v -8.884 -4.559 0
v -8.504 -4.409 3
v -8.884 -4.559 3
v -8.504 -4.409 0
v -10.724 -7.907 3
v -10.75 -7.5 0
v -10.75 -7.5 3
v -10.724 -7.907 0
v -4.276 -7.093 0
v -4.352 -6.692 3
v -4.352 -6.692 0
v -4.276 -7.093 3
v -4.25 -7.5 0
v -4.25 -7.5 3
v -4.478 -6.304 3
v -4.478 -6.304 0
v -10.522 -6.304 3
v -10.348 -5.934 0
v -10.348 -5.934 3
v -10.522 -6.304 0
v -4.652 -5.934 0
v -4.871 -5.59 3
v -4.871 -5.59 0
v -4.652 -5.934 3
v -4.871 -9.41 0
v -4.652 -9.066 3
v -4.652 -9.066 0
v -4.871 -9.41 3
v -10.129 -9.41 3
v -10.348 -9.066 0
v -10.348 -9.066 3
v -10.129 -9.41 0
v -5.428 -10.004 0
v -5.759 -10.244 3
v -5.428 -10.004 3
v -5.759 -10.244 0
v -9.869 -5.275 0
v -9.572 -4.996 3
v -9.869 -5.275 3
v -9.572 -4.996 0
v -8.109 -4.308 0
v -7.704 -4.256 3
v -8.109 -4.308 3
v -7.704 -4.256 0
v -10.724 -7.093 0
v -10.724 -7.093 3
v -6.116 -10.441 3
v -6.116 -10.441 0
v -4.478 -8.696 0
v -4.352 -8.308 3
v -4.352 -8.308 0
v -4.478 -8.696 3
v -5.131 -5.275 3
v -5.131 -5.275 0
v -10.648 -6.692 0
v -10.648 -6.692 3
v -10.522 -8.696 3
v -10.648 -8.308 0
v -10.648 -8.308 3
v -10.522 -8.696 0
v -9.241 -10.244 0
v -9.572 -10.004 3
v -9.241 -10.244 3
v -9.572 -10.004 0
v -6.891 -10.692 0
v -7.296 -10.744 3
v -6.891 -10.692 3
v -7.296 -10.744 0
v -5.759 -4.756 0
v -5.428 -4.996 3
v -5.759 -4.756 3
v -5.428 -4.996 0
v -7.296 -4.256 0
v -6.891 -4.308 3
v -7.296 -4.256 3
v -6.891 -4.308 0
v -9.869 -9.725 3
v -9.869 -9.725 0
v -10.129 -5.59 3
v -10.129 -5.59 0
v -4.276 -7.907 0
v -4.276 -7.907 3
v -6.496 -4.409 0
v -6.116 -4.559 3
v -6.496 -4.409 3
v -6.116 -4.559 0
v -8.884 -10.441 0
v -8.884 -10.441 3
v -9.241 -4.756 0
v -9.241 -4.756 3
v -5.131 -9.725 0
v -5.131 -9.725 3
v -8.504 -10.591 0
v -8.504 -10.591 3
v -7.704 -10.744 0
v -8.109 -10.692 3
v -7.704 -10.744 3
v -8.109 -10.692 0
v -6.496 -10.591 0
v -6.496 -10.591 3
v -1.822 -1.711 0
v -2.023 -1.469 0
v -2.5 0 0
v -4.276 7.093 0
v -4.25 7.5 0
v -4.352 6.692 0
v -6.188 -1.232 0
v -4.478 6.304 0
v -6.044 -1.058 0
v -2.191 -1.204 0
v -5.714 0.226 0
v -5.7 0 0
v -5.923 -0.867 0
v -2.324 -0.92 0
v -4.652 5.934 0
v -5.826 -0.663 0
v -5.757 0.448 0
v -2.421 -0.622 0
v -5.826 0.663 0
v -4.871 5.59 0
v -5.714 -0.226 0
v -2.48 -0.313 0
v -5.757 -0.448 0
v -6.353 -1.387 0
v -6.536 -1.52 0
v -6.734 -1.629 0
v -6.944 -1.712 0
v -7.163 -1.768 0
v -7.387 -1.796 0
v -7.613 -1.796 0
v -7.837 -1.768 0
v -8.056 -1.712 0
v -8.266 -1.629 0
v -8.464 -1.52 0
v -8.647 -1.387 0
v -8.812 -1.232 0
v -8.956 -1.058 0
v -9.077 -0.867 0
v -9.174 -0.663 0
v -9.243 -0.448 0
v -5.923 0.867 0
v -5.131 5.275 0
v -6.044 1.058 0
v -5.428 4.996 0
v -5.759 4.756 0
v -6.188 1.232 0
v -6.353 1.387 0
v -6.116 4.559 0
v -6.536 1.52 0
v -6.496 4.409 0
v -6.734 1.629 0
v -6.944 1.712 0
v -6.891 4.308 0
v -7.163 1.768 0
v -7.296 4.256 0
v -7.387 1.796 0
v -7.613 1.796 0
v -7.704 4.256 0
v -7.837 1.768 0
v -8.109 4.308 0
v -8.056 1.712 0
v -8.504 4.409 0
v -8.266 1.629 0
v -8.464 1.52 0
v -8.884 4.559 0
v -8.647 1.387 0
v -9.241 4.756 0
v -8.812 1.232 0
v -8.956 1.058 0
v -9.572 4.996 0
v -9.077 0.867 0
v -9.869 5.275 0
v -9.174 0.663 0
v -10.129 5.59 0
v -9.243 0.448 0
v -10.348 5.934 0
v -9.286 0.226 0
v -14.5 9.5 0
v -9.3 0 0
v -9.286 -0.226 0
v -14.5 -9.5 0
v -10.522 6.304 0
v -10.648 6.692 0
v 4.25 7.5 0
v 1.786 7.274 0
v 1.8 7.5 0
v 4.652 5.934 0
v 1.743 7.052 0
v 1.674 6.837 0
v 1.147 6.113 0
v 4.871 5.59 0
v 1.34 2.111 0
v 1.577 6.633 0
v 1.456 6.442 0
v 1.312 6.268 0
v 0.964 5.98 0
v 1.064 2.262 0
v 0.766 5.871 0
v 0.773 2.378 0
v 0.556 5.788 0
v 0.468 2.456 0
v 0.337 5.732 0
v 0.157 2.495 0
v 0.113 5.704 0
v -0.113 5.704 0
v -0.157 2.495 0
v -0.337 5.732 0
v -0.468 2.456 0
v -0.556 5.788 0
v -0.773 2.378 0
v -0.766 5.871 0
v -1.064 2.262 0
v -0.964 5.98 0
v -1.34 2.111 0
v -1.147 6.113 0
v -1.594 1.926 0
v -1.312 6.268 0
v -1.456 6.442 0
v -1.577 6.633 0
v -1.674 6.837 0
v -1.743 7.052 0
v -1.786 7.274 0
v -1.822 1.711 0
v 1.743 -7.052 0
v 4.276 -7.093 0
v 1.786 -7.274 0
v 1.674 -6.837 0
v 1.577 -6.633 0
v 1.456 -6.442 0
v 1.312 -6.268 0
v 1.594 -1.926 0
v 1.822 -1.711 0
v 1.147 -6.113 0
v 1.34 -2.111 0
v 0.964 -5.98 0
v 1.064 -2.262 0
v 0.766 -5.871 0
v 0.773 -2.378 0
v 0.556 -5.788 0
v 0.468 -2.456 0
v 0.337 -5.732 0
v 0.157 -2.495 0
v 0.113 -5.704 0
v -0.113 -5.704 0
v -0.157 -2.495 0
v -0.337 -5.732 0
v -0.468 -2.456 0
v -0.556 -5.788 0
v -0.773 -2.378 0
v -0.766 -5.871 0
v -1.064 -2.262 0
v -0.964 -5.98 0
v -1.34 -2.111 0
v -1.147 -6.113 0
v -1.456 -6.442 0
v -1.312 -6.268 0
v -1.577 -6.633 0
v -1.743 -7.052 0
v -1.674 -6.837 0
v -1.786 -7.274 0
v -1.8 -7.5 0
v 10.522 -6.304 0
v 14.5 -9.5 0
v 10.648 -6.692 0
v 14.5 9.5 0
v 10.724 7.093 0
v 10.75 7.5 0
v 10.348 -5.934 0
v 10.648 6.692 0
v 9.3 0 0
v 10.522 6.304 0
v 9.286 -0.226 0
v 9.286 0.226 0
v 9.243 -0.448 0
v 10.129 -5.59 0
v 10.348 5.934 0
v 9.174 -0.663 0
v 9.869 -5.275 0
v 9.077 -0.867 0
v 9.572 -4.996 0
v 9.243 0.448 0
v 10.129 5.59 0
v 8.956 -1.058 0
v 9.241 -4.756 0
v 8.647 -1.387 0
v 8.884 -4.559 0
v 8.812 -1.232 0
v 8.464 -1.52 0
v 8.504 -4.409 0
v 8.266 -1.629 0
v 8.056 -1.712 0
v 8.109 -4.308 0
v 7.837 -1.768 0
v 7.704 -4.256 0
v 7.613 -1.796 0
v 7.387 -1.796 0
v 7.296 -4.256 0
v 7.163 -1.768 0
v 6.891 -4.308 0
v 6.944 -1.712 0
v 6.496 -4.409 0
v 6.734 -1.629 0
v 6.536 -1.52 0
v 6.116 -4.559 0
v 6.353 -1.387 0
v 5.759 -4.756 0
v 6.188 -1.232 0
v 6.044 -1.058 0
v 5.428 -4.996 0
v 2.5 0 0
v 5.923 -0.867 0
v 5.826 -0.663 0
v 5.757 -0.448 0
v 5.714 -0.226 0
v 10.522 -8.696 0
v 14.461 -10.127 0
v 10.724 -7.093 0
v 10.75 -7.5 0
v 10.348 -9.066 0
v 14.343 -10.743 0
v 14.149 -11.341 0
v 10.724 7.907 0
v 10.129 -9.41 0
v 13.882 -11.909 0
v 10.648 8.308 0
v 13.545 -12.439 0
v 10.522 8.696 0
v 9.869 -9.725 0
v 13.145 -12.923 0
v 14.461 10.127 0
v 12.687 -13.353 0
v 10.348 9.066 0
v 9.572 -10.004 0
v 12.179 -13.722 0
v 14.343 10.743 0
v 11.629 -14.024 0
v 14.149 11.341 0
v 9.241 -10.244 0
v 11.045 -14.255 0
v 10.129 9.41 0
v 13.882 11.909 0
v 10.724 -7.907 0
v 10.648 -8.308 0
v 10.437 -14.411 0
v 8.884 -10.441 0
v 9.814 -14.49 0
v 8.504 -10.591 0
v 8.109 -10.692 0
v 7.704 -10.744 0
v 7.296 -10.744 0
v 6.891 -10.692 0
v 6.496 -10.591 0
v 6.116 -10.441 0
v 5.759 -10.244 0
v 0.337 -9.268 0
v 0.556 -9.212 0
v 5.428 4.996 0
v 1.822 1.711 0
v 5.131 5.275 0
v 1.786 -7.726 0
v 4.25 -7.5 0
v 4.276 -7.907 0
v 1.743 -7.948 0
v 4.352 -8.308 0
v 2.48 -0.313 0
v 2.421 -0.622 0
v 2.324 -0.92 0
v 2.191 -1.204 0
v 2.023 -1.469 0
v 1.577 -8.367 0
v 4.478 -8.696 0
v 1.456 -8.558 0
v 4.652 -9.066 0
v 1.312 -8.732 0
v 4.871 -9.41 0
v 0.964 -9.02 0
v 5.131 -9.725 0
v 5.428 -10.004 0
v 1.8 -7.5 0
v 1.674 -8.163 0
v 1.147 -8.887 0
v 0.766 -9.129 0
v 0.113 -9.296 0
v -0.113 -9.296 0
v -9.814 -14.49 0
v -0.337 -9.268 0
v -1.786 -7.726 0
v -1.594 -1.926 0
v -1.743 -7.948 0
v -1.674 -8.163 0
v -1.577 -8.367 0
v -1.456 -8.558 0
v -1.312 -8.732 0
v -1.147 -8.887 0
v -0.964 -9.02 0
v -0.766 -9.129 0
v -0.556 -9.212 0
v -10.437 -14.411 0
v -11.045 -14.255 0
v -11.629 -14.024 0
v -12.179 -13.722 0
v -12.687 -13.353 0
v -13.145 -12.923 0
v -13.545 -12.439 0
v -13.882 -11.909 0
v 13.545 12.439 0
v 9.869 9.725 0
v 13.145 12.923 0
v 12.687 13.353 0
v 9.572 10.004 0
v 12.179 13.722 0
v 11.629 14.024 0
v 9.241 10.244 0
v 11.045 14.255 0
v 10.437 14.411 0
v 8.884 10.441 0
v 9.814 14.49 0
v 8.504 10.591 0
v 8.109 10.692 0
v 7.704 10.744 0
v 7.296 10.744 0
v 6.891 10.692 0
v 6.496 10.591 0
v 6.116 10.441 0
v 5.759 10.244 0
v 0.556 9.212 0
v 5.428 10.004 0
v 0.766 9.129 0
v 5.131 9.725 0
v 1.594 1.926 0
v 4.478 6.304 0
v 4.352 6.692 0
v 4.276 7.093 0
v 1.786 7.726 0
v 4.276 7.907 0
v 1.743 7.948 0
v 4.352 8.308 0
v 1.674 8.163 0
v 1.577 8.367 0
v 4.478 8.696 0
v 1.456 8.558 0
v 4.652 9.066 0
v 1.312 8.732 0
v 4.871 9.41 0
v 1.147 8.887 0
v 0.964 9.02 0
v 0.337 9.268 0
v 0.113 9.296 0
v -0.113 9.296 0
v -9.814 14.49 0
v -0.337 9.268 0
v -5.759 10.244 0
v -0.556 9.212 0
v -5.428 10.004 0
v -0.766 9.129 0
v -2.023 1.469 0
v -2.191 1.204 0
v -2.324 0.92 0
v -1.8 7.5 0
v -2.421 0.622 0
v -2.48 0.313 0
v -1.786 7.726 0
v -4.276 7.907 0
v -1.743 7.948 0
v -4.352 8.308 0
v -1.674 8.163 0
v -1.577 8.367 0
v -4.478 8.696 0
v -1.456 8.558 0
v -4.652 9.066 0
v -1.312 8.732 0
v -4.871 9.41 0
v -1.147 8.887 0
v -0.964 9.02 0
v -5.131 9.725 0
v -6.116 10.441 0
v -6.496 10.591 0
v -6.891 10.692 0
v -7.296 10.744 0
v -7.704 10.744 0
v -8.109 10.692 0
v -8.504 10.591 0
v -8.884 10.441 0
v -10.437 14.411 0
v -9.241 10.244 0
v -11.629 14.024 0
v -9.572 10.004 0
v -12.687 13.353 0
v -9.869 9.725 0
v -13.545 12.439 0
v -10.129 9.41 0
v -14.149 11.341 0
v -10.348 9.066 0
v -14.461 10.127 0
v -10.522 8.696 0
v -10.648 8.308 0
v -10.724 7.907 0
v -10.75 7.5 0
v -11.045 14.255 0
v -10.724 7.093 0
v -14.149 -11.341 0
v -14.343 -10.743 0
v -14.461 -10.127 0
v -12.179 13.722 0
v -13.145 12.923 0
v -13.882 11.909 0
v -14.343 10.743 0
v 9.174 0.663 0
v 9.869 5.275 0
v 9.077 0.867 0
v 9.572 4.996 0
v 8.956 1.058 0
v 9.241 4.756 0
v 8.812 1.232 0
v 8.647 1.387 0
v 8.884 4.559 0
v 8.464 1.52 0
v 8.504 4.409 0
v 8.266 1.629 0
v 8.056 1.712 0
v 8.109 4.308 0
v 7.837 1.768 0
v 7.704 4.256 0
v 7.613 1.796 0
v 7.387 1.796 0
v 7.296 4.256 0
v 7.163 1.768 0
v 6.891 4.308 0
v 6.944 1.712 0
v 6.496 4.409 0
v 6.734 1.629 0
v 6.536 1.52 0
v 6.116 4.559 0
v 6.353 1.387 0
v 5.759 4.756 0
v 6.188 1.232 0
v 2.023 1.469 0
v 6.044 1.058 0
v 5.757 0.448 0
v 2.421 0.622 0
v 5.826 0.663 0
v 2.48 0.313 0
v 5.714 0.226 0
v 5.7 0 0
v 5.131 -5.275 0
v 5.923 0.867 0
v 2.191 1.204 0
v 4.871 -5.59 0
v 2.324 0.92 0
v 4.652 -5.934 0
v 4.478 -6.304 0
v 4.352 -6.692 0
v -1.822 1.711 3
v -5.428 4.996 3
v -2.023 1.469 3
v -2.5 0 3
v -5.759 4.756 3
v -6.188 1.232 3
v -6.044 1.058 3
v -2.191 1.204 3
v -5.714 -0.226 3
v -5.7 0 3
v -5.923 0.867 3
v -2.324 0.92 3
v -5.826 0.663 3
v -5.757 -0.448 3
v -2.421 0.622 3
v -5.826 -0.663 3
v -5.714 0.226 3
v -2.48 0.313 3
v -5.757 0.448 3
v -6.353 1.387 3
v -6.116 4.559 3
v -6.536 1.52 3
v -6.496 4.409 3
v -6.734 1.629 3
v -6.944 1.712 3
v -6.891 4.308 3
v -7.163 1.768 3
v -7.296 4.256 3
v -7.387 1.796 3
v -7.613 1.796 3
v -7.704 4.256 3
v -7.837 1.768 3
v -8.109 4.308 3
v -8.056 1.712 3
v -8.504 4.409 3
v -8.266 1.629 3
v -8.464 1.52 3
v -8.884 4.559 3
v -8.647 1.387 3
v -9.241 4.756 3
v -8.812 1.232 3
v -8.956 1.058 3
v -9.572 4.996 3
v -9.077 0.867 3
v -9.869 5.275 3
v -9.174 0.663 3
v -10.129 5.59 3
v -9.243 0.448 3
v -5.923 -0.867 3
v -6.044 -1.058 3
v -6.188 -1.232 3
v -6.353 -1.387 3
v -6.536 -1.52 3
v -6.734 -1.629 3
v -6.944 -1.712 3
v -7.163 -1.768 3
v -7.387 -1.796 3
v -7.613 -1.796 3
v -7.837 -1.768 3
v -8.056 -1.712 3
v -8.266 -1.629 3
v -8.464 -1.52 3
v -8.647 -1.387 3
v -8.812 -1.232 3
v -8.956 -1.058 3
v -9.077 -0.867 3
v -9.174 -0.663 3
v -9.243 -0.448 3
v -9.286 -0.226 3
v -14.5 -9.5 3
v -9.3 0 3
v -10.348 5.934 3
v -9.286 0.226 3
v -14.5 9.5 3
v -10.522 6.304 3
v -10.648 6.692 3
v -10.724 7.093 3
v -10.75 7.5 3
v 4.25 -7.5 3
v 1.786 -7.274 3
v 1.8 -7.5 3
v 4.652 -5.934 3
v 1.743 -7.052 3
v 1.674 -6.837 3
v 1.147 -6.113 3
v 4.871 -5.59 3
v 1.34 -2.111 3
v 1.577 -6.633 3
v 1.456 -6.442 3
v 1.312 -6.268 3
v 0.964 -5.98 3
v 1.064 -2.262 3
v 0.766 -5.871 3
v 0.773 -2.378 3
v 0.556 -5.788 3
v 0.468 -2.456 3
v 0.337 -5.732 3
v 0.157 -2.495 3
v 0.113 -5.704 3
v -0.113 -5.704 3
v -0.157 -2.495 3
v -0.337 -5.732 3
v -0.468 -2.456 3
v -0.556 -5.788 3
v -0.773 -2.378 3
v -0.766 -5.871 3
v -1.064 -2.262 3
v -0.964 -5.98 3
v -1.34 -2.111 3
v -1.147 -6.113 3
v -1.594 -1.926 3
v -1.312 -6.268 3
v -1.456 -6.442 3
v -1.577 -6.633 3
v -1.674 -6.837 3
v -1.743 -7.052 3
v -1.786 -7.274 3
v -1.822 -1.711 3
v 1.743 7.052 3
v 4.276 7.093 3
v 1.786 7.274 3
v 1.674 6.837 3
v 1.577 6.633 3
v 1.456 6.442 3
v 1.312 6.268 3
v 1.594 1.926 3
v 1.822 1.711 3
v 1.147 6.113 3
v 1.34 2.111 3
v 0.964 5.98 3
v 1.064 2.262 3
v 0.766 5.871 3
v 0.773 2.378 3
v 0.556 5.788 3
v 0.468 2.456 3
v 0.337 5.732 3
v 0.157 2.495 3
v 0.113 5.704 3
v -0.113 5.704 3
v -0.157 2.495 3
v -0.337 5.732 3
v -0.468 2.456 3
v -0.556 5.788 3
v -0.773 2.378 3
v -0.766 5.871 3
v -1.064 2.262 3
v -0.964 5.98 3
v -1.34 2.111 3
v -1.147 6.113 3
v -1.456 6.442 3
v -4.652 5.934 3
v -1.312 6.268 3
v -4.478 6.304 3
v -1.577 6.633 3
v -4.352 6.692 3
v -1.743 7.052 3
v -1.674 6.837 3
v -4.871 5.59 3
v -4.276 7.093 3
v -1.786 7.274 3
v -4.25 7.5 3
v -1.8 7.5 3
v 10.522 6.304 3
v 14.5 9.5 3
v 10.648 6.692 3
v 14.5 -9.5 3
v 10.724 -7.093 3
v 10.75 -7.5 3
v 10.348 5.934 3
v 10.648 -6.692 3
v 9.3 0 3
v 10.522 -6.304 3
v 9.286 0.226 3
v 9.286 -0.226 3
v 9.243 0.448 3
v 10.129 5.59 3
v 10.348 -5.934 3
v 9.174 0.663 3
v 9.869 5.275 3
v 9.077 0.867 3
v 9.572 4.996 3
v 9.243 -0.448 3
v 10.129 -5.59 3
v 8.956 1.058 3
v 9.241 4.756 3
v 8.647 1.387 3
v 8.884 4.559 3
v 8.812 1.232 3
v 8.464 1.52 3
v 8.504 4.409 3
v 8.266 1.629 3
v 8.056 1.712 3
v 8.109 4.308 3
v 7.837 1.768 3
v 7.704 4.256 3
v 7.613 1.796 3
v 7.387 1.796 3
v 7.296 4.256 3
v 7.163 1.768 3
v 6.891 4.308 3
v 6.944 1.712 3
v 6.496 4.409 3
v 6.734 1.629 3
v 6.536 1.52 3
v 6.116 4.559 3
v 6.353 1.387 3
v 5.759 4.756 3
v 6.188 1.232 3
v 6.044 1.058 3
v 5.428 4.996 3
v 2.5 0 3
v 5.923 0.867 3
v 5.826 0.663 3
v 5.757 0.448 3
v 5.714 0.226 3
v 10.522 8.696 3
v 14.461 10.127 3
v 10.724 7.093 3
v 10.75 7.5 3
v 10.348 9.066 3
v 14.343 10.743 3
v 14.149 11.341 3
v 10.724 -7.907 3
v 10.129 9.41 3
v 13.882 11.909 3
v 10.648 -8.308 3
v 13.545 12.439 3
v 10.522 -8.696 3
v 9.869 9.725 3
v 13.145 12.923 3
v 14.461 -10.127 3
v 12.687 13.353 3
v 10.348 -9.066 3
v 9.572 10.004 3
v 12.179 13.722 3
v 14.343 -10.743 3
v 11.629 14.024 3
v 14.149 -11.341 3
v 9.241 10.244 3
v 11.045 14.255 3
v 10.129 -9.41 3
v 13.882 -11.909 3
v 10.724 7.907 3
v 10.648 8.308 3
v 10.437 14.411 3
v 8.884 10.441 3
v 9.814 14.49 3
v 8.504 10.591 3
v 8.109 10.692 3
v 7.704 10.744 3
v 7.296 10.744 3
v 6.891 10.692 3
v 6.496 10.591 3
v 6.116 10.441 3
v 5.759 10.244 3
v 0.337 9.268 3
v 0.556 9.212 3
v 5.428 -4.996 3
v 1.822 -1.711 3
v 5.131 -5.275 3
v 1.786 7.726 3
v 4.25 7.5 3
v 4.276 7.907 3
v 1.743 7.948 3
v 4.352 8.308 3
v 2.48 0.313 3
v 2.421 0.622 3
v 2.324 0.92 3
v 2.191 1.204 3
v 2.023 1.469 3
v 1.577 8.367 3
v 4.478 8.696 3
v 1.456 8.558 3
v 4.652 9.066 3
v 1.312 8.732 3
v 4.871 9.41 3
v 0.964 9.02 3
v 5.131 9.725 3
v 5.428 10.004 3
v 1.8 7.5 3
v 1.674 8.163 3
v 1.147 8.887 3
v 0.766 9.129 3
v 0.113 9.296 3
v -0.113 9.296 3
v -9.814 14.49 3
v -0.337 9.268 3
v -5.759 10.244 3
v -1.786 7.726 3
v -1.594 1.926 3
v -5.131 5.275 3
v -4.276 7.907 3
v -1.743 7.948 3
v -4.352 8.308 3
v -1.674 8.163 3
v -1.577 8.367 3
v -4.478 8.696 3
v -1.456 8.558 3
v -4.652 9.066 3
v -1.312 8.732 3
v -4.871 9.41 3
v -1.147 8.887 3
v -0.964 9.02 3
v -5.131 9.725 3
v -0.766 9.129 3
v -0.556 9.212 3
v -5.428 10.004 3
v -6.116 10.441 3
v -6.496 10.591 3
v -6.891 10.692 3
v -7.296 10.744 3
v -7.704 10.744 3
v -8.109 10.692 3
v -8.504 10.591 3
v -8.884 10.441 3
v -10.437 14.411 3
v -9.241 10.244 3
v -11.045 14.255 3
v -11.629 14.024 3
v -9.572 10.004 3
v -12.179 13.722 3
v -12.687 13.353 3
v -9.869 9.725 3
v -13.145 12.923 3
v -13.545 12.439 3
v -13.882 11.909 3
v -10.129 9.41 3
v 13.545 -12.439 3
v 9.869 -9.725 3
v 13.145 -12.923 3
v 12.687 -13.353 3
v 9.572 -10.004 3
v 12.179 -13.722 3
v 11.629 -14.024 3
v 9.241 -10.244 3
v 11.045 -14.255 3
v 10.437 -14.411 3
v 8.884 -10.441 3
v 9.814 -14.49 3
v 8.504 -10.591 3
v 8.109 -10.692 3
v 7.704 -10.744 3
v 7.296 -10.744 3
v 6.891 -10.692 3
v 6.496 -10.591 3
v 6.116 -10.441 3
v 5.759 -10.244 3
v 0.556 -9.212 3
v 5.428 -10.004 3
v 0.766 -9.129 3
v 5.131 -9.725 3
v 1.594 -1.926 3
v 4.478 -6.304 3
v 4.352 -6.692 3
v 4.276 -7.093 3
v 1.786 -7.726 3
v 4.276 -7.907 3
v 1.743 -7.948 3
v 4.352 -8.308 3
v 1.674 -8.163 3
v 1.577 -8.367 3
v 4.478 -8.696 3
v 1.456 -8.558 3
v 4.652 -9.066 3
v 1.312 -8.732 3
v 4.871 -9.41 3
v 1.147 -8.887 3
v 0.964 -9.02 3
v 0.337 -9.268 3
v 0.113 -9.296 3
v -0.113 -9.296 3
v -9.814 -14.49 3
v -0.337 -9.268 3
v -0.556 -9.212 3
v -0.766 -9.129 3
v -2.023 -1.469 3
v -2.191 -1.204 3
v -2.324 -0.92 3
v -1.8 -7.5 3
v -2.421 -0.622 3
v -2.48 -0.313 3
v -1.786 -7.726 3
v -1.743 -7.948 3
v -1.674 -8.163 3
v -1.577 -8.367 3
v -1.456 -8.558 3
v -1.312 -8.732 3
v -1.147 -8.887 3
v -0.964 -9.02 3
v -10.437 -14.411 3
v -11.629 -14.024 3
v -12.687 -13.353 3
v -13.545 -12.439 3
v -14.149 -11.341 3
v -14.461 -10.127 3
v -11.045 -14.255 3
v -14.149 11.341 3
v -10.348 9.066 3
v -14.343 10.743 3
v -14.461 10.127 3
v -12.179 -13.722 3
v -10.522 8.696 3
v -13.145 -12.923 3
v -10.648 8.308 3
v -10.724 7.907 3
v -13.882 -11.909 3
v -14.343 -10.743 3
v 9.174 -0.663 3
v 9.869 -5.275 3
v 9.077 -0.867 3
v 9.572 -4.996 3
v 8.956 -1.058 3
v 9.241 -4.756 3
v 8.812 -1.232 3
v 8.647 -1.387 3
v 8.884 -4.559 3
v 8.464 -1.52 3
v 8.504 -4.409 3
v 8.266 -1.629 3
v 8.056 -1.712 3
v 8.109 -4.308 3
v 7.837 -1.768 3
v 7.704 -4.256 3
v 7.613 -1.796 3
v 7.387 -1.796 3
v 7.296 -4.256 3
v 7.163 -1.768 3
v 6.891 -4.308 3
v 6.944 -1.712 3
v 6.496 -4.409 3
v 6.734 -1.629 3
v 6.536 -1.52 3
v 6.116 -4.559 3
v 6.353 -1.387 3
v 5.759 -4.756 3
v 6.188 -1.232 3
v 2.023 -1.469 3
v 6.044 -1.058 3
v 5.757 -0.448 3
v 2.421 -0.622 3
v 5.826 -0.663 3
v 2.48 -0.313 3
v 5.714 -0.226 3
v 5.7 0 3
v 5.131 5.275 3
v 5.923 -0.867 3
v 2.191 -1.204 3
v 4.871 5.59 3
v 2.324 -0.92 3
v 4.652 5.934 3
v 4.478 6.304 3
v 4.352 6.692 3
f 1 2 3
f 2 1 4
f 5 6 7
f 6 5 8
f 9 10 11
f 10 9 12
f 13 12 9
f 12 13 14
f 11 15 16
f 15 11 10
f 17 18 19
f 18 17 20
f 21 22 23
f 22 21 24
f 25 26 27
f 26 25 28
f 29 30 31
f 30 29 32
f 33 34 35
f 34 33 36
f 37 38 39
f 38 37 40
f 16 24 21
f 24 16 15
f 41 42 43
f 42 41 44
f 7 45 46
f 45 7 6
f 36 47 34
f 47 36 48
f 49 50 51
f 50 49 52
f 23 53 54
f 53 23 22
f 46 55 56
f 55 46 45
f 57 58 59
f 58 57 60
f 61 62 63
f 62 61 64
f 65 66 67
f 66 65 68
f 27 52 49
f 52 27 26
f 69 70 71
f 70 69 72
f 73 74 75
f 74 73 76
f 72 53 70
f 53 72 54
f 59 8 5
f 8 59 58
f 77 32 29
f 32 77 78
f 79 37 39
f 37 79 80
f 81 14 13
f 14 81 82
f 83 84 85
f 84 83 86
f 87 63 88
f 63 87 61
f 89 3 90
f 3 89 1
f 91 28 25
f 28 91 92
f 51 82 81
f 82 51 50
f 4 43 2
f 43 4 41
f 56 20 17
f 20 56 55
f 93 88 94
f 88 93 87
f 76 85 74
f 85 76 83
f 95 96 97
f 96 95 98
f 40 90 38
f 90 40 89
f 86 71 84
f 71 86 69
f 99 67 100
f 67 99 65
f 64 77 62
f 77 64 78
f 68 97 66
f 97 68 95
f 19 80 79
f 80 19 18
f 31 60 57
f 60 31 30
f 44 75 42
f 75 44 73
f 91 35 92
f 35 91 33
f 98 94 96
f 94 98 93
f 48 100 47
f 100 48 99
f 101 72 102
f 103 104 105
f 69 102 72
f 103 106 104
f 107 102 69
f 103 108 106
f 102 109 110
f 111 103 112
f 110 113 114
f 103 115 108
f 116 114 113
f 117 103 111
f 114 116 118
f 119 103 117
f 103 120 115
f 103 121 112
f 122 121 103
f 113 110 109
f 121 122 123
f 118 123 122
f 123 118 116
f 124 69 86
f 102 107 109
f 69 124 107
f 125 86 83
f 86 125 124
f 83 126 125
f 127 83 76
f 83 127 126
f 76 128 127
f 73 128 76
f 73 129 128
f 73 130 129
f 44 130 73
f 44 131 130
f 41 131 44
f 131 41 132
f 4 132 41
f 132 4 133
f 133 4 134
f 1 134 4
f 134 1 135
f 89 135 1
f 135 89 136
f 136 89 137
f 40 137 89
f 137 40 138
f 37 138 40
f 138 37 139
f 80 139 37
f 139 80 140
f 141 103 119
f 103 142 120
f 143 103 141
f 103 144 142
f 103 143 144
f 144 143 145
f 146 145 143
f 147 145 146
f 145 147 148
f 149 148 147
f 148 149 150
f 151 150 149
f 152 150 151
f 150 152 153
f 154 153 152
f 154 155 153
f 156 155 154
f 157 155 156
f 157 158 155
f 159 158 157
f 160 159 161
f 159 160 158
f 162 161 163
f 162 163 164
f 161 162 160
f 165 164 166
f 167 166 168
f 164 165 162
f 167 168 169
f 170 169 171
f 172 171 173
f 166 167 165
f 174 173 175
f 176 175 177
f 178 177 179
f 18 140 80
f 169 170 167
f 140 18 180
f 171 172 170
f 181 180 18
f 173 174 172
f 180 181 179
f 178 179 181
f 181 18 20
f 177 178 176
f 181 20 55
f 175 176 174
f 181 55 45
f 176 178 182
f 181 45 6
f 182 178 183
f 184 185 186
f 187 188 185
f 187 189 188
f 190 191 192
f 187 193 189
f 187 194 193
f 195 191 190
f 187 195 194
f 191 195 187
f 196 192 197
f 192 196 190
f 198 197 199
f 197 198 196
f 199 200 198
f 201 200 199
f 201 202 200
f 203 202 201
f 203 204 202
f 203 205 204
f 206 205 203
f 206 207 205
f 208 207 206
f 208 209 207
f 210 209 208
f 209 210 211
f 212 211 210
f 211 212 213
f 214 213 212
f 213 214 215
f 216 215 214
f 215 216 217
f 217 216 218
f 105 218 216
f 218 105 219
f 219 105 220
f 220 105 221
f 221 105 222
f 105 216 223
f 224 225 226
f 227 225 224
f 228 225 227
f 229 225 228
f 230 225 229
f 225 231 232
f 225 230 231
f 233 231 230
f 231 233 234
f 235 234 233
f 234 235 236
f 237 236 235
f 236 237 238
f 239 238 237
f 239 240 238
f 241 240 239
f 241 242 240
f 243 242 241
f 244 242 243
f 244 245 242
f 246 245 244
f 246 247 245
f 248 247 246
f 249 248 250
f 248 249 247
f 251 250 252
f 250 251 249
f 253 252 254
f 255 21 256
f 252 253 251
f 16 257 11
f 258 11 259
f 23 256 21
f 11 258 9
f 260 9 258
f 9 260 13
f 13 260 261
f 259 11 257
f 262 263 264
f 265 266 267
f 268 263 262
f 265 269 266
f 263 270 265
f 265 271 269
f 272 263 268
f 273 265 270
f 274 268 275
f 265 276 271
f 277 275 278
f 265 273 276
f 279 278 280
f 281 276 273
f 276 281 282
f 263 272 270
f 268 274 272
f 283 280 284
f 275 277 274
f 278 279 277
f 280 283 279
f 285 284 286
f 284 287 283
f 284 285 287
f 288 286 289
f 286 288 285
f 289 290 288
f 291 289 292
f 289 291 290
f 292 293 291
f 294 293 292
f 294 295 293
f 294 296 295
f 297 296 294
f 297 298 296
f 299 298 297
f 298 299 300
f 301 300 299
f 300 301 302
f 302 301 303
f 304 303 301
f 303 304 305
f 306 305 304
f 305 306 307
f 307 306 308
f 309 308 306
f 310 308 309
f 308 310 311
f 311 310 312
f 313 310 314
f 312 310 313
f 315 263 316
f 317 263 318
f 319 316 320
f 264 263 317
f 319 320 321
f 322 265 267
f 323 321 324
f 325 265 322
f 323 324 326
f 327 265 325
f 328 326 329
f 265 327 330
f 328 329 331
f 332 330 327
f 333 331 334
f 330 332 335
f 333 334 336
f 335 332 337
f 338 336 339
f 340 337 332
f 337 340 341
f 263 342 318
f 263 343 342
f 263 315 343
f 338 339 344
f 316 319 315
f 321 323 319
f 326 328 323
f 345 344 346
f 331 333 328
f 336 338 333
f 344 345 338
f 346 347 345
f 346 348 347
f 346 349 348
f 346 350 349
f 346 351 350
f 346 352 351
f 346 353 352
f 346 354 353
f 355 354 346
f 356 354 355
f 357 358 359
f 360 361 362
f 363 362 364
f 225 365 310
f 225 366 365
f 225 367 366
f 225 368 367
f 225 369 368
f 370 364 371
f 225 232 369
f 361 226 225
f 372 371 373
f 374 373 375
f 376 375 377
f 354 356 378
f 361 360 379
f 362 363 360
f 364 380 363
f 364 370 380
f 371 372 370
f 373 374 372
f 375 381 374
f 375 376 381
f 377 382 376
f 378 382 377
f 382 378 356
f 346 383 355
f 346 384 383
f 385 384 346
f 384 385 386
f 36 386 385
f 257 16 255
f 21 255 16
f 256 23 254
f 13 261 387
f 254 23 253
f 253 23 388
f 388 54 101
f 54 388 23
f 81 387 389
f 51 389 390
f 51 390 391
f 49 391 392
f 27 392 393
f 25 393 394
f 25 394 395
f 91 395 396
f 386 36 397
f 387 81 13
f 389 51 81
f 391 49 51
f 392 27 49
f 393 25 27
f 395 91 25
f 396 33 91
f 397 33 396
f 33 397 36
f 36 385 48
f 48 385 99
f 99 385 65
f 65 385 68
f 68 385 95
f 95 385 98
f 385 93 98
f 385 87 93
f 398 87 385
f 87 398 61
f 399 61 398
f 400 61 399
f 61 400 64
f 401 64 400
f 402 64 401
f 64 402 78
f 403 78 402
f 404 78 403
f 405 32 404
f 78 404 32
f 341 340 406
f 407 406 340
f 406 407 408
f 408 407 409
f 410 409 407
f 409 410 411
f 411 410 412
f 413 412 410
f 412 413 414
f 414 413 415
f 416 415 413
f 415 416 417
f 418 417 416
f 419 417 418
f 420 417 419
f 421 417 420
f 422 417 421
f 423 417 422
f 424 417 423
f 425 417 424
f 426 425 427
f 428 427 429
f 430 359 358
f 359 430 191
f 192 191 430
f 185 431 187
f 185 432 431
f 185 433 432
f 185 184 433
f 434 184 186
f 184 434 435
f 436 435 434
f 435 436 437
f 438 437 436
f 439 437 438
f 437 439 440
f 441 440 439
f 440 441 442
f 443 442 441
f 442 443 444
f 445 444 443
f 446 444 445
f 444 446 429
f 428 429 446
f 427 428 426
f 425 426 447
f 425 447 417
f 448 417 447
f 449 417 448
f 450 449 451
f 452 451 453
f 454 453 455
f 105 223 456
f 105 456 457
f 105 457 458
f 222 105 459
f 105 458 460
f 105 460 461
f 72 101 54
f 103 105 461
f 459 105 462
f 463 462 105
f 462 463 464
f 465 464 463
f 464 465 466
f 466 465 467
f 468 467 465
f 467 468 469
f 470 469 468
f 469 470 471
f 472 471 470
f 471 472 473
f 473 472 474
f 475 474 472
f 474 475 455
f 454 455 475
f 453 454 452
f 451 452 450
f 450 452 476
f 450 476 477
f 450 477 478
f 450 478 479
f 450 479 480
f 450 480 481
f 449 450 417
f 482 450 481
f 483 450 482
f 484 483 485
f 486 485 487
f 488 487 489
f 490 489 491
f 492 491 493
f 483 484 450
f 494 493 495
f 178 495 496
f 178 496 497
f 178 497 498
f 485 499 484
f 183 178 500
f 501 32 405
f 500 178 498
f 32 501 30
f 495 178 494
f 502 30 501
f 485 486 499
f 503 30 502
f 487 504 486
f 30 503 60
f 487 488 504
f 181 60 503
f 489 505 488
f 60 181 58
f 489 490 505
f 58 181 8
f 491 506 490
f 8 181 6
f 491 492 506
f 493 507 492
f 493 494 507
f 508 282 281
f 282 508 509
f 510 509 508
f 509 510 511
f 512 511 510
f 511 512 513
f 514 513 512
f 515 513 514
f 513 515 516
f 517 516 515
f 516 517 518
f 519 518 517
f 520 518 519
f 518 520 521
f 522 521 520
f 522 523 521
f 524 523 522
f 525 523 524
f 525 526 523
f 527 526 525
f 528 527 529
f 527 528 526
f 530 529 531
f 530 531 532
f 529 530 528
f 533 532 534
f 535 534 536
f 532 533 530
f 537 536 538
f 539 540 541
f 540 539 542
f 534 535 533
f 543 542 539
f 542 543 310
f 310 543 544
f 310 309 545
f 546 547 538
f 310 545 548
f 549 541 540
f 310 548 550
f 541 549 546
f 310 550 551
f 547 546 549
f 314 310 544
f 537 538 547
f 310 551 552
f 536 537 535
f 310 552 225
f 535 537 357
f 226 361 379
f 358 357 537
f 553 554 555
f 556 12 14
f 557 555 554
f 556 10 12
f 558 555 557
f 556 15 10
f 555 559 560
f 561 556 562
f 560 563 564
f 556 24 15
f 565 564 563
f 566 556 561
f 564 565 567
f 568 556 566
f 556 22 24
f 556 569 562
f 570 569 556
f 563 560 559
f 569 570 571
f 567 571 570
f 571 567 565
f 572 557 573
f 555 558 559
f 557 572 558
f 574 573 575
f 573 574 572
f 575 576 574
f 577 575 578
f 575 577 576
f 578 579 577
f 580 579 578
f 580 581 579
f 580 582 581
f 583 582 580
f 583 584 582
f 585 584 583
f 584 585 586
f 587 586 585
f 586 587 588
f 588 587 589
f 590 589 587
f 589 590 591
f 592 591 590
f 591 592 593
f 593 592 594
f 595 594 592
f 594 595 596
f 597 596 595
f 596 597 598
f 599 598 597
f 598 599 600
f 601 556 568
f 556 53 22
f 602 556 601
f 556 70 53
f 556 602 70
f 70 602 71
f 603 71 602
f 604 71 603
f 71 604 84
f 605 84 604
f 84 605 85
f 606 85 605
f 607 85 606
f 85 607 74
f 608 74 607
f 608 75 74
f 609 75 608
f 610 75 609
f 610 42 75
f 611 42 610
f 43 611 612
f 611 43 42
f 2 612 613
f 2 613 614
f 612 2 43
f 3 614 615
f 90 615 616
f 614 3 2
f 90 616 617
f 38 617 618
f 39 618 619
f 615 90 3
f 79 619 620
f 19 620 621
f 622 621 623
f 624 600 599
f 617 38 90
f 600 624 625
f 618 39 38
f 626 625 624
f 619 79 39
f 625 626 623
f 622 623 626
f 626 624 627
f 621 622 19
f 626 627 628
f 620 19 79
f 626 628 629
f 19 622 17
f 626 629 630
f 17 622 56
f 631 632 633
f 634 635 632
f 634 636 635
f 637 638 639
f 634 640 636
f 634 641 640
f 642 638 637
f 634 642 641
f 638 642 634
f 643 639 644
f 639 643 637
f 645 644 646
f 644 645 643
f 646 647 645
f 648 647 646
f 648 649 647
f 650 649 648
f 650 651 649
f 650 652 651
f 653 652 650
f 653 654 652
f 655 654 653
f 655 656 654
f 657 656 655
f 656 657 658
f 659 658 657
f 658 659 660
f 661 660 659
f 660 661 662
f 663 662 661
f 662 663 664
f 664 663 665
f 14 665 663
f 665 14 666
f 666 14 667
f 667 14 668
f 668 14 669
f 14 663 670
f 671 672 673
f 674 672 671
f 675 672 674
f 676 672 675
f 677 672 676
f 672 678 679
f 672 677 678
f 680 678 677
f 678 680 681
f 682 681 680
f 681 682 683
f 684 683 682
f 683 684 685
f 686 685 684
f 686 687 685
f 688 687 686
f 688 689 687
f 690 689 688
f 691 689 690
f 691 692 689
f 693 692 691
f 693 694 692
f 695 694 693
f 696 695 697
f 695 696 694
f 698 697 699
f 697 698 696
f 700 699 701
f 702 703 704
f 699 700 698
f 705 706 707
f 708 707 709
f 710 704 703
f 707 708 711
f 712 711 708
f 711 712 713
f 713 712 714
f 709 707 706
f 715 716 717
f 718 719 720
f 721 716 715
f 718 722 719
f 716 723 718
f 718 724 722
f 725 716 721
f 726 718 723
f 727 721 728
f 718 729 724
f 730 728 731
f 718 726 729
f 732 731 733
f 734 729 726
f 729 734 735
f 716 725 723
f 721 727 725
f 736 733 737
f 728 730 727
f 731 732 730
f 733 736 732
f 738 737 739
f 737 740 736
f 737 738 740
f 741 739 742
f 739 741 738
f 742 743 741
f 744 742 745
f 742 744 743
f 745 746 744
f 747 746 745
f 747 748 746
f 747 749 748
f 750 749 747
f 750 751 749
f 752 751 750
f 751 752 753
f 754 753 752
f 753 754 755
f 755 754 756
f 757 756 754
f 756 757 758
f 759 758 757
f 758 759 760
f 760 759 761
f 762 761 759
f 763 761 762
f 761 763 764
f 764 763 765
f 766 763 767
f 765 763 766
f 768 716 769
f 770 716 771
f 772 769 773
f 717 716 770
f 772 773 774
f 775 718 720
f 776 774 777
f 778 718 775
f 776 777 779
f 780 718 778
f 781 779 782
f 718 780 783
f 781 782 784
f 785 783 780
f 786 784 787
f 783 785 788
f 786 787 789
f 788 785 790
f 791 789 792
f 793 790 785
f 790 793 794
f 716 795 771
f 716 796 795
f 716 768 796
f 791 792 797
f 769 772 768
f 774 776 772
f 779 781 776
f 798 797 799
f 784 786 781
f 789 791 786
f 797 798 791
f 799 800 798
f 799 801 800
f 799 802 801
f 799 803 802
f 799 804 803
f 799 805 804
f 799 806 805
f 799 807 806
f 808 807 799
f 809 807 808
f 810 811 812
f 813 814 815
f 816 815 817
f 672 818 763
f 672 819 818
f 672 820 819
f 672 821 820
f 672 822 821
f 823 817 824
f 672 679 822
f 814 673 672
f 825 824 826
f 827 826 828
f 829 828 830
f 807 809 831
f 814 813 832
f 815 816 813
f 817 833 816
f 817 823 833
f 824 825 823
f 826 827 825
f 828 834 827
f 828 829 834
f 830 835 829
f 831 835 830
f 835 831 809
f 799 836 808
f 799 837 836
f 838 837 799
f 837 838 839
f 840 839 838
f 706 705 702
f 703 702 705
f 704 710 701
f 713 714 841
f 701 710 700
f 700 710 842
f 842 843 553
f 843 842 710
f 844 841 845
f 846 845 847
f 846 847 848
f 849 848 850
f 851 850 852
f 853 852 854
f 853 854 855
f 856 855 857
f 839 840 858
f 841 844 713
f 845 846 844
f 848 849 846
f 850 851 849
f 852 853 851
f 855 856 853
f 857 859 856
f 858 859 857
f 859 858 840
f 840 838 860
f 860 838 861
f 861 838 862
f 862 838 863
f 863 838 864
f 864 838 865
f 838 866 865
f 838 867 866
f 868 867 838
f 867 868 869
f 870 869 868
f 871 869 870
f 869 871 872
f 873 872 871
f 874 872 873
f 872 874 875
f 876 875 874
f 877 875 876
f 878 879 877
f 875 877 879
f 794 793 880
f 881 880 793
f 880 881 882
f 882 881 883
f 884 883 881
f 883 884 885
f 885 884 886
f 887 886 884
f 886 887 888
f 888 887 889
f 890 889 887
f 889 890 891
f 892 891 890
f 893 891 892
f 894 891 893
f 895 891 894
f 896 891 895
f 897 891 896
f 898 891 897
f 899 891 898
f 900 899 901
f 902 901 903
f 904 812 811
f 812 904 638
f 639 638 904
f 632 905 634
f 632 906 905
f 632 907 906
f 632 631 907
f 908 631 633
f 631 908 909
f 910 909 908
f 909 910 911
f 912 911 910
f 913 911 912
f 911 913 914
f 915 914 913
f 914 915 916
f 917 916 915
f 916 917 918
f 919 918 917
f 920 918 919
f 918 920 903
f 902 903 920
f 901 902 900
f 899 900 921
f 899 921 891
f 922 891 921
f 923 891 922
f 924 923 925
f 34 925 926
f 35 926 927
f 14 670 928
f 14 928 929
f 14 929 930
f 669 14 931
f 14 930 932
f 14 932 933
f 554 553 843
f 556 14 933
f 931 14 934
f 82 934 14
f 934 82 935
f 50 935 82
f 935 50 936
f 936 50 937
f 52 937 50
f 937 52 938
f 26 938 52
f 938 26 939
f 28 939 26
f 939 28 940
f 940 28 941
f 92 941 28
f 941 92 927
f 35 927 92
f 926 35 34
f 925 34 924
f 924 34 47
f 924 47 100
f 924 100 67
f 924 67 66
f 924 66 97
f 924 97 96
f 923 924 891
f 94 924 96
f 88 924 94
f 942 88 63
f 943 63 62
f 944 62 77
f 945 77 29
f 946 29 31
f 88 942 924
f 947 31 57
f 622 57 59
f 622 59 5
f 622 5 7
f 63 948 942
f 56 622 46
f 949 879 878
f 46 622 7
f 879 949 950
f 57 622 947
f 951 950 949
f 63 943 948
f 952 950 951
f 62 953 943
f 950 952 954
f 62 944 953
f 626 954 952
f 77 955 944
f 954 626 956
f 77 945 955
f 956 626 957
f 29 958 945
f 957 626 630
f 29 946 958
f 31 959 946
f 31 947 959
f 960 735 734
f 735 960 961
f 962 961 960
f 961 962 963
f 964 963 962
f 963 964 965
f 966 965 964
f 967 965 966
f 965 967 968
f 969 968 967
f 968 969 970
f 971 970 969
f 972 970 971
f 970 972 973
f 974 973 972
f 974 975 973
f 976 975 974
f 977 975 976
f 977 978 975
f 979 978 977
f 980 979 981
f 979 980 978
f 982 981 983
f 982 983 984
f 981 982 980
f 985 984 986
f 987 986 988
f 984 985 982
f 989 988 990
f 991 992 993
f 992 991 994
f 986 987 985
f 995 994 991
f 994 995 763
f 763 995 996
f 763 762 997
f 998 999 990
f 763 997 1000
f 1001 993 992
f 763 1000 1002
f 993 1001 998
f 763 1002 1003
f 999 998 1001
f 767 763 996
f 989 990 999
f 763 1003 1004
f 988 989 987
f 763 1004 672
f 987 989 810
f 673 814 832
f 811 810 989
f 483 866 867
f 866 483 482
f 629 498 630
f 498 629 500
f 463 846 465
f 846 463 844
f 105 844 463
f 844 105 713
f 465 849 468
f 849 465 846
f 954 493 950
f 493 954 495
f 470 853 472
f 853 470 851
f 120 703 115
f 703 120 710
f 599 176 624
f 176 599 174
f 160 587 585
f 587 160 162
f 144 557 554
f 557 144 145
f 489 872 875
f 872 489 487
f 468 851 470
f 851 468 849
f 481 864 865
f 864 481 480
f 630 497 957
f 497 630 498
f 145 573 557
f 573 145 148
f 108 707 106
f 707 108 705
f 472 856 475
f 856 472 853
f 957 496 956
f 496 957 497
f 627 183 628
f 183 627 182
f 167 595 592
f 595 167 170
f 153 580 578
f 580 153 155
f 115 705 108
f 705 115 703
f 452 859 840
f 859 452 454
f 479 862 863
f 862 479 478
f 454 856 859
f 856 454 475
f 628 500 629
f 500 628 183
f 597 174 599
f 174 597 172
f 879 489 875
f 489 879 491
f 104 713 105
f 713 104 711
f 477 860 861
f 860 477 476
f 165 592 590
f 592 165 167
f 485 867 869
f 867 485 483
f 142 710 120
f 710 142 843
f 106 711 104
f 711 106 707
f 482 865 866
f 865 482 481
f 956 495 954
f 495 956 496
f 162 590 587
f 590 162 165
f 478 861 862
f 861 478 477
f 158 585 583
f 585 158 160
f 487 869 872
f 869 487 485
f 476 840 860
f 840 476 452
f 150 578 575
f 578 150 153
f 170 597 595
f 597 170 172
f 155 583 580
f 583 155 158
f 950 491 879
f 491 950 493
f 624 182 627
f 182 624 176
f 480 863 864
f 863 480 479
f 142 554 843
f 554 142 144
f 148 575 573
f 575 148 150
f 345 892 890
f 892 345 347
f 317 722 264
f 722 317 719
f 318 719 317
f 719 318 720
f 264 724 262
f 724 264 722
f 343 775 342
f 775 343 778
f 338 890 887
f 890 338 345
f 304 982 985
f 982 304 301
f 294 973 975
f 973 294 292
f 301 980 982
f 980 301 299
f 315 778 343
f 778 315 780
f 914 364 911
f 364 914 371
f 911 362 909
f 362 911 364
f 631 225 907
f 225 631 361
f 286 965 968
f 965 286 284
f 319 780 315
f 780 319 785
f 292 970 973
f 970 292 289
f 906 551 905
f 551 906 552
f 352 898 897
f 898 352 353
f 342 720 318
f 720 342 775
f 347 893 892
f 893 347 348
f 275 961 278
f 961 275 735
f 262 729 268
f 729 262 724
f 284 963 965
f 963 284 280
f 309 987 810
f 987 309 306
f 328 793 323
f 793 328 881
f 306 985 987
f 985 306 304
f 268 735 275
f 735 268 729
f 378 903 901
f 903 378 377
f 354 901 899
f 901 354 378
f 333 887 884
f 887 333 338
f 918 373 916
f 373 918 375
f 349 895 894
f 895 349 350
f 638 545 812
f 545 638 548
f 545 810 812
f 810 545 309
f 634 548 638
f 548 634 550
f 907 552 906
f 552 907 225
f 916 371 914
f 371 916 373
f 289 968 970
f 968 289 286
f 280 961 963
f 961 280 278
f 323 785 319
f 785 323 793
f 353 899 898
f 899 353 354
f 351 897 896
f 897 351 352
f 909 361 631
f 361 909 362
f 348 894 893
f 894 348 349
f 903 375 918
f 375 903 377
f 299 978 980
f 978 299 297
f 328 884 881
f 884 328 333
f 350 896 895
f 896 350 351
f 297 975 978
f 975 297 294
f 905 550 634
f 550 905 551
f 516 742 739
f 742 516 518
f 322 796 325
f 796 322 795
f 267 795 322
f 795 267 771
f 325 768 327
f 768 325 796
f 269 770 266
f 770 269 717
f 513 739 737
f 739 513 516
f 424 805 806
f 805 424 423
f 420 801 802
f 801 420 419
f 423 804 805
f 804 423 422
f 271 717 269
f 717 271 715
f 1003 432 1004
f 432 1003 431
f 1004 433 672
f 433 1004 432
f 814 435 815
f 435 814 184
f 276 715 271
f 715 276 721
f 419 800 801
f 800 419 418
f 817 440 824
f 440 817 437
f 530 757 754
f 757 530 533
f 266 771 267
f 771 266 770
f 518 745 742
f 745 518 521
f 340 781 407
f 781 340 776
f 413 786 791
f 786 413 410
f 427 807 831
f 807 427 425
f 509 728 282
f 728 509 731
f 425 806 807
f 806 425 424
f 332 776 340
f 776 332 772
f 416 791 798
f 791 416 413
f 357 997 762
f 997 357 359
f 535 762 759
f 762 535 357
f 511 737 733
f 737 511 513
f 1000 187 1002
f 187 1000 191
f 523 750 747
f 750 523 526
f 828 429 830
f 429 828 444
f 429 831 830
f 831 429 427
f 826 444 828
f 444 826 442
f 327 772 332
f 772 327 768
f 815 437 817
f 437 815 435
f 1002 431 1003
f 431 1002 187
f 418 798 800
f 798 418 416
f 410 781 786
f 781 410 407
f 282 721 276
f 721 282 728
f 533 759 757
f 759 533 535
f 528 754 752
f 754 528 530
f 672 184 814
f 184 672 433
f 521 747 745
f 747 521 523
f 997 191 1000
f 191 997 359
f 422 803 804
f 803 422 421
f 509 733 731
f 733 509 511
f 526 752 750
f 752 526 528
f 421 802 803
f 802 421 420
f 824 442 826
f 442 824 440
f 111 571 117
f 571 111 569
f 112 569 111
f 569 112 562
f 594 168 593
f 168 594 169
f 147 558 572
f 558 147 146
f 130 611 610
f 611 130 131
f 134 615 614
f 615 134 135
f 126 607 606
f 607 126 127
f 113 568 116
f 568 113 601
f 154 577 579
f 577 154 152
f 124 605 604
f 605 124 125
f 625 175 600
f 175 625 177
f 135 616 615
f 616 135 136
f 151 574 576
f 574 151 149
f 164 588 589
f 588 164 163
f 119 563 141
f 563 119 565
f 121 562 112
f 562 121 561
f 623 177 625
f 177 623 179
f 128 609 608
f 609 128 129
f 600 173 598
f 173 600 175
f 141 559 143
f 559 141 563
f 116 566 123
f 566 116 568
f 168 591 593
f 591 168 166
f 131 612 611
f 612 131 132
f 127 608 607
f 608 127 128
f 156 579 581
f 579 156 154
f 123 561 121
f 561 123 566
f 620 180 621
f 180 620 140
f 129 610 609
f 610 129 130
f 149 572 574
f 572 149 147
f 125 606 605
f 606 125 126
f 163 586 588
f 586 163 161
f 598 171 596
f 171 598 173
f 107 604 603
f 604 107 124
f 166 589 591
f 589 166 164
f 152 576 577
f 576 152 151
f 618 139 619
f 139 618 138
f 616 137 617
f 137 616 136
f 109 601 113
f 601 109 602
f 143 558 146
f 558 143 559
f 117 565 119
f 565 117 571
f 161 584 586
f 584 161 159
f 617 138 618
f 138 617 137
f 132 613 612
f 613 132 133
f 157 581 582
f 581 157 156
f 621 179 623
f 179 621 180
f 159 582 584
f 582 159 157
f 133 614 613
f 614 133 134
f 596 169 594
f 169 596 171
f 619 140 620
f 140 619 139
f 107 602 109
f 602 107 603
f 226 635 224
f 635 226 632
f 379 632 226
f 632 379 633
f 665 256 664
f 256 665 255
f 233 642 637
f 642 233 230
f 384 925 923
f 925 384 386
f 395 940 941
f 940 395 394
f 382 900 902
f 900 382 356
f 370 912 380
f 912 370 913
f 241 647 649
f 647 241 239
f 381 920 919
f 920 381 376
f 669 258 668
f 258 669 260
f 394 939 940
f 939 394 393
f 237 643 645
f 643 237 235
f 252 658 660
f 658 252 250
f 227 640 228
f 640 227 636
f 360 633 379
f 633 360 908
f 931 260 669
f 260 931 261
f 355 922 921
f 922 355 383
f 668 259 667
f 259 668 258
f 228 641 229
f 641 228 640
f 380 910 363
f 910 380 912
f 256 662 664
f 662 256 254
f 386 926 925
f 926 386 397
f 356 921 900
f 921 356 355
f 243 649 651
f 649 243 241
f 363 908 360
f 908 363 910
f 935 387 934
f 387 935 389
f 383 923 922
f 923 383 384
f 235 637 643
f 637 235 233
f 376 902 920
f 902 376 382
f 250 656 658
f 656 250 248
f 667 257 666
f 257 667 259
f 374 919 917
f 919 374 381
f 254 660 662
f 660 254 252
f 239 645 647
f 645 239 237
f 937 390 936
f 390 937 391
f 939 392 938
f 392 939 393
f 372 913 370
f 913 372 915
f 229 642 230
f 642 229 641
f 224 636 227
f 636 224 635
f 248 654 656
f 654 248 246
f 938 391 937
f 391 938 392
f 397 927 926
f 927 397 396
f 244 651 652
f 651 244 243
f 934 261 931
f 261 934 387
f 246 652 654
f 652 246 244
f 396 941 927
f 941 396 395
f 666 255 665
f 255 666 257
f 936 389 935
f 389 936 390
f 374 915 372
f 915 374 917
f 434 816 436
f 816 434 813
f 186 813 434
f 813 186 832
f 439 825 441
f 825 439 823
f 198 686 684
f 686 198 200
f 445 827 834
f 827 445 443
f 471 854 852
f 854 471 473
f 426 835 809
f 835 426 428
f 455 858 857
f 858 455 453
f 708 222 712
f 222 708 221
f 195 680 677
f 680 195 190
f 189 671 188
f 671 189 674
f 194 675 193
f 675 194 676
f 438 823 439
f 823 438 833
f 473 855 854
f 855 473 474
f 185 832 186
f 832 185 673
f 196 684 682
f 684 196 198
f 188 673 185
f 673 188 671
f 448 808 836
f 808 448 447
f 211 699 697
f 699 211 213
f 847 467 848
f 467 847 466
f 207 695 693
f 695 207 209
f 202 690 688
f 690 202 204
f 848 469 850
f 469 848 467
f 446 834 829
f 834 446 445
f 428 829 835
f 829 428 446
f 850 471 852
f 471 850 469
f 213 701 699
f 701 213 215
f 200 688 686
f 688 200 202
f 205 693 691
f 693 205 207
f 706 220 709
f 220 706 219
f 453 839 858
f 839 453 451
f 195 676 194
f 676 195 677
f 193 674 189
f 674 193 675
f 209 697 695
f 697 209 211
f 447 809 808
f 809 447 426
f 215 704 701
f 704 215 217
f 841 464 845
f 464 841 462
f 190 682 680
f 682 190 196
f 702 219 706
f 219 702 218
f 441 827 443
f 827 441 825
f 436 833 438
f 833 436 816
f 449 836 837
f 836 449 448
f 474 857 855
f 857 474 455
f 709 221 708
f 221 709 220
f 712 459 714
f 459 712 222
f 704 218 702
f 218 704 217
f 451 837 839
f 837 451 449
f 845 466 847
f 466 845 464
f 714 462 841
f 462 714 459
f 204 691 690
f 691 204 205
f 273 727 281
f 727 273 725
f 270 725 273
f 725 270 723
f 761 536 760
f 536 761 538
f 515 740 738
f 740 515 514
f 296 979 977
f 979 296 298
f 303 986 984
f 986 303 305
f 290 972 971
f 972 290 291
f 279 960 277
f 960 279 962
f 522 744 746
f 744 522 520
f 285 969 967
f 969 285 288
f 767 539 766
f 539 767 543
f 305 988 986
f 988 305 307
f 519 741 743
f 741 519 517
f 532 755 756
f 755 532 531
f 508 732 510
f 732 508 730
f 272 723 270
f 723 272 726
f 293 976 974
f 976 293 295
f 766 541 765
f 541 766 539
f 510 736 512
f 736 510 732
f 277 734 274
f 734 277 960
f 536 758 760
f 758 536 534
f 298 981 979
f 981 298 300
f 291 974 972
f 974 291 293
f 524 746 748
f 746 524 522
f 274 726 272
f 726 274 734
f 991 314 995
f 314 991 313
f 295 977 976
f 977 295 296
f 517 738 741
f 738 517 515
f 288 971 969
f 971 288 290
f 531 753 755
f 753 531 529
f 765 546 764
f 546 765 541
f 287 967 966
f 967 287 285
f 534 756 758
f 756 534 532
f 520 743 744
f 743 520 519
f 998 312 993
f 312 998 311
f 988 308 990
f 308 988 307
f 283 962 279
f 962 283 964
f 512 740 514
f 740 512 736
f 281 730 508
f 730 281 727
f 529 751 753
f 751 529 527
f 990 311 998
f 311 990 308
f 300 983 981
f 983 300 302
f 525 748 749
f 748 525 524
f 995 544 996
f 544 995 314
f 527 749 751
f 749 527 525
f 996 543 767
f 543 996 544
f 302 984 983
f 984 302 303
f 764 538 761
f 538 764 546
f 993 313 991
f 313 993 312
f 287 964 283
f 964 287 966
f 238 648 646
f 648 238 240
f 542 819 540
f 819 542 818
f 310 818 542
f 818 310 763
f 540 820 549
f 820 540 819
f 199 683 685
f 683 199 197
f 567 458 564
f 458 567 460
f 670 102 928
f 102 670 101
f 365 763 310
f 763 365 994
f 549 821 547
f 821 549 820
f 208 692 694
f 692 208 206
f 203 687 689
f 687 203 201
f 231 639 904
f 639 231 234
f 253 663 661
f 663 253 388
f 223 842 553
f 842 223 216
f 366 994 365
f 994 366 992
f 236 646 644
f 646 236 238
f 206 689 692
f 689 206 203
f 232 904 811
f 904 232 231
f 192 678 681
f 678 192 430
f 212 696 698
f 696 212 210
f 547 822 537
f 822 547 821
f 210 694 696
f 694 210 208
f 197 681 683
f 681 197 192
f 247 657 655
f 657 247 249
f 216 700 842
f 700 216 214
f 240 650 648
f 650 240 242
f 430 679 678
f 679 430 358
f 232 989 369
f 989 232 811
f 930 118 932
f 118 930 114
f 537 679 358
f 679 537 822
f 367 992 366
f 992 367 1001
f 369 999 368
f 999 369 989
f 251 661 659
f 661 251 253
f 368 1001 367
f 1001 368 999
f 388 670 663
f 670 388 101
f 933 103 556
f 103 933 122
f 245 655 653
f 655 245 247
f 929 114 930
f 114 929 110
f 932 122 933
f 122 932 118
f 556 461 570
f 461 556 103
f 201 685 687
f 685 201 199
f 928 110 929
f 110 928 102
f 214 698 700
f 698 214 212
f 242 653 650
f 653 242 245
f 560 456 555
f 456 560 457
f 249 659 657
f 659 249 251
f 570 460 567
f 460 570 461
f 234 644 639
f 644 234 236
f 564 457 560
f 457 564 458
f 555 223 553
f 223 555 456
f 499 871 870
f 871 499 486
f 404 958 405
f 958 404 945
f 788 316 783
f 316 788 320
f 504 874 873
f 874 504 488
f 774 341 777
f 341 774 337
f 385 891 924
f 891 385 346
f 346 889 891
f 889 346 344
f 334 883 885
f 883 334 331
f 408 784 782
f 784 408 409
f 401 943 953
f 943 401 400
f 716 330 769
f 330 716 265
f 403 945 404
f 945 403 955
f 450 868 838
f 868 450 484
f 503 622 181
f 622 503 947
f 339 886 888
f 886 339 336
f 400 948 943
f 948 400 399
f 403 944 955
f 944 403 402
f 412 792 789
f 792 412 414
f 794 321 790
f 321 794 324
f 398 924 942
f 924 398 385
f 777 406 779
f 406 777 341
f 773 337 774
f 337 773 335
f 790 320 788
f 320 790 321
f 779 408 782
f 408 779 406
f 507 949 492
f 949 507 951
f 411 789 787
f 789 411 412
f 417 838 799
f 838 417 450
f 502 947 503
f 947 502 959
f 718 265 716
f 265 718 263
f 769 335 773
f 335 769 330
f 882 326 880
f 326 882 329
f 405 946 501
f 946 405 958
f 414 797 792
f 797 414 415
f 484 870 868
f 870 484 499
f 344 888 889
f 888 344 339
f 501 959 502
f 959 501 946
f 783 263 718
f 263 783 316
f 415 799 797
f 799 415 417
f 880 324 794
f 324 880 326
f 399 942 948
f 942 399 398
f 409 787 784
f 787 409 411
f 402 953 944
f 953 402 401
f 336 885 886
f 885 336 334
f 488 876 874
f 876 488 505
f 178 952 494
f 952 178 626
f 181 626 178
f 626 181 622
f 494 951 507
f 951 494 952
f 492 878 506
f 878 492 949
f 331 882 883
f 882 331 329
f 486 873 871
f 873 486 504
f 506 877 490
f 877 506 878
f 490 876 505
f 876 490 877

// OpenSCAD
$fn = 50;

difference() {
	union() {
		hull() {
			translate(v = [-9.5, 9.5, 0]) {
				cylinder(h = 3, r = 5);
			}
			translate(v = [9.5, 9.5, 0]) {
				cylinder(h = 3, r = 5);
			}
			translate(v = [-9.5, -9.5, 0]) {
				cylinder(h = 3, r = 5);
			}
			translate(v = [9.5, -9.5, 0]) {
				cylinder(h = 3, r = 5);
			}
		}
	}
	union() {
		translate(v = [-7.5, -7.5, 0]) {
			cylinder(h = 3, r = 3.25);
		}
		translate(v = [-7.5, 7.5, 0]) {
			cylinder(h = 3, r = 3.25);
		}
		translate(v = [7.5, -7.5, 0]) {
			cylinder(h = 3, r = 3.25);
		}
		translate(v = [7.5, 7.5, 0]) {
			cylinder(h = 3, r = 3.25);
		}
		translate(v = [-7.5, 0.0, 0]) {
			cylinder(h = 3, r = 1.8);
		}
		translate(v = [0.0, -7.5, 0]) {
			cylinder(h = 3, r = 1.8);
		}
		translate(v = [0.0, 7.5, 0]) {
			cylinder(h = 3, r = 1.8);
		}
		translate(v = [7.5, 0.0, 0]) {
			cylinder(h = 3, r = 1.8);
		}
		cylinder(h = 3, r = 2.5);
	}
}
